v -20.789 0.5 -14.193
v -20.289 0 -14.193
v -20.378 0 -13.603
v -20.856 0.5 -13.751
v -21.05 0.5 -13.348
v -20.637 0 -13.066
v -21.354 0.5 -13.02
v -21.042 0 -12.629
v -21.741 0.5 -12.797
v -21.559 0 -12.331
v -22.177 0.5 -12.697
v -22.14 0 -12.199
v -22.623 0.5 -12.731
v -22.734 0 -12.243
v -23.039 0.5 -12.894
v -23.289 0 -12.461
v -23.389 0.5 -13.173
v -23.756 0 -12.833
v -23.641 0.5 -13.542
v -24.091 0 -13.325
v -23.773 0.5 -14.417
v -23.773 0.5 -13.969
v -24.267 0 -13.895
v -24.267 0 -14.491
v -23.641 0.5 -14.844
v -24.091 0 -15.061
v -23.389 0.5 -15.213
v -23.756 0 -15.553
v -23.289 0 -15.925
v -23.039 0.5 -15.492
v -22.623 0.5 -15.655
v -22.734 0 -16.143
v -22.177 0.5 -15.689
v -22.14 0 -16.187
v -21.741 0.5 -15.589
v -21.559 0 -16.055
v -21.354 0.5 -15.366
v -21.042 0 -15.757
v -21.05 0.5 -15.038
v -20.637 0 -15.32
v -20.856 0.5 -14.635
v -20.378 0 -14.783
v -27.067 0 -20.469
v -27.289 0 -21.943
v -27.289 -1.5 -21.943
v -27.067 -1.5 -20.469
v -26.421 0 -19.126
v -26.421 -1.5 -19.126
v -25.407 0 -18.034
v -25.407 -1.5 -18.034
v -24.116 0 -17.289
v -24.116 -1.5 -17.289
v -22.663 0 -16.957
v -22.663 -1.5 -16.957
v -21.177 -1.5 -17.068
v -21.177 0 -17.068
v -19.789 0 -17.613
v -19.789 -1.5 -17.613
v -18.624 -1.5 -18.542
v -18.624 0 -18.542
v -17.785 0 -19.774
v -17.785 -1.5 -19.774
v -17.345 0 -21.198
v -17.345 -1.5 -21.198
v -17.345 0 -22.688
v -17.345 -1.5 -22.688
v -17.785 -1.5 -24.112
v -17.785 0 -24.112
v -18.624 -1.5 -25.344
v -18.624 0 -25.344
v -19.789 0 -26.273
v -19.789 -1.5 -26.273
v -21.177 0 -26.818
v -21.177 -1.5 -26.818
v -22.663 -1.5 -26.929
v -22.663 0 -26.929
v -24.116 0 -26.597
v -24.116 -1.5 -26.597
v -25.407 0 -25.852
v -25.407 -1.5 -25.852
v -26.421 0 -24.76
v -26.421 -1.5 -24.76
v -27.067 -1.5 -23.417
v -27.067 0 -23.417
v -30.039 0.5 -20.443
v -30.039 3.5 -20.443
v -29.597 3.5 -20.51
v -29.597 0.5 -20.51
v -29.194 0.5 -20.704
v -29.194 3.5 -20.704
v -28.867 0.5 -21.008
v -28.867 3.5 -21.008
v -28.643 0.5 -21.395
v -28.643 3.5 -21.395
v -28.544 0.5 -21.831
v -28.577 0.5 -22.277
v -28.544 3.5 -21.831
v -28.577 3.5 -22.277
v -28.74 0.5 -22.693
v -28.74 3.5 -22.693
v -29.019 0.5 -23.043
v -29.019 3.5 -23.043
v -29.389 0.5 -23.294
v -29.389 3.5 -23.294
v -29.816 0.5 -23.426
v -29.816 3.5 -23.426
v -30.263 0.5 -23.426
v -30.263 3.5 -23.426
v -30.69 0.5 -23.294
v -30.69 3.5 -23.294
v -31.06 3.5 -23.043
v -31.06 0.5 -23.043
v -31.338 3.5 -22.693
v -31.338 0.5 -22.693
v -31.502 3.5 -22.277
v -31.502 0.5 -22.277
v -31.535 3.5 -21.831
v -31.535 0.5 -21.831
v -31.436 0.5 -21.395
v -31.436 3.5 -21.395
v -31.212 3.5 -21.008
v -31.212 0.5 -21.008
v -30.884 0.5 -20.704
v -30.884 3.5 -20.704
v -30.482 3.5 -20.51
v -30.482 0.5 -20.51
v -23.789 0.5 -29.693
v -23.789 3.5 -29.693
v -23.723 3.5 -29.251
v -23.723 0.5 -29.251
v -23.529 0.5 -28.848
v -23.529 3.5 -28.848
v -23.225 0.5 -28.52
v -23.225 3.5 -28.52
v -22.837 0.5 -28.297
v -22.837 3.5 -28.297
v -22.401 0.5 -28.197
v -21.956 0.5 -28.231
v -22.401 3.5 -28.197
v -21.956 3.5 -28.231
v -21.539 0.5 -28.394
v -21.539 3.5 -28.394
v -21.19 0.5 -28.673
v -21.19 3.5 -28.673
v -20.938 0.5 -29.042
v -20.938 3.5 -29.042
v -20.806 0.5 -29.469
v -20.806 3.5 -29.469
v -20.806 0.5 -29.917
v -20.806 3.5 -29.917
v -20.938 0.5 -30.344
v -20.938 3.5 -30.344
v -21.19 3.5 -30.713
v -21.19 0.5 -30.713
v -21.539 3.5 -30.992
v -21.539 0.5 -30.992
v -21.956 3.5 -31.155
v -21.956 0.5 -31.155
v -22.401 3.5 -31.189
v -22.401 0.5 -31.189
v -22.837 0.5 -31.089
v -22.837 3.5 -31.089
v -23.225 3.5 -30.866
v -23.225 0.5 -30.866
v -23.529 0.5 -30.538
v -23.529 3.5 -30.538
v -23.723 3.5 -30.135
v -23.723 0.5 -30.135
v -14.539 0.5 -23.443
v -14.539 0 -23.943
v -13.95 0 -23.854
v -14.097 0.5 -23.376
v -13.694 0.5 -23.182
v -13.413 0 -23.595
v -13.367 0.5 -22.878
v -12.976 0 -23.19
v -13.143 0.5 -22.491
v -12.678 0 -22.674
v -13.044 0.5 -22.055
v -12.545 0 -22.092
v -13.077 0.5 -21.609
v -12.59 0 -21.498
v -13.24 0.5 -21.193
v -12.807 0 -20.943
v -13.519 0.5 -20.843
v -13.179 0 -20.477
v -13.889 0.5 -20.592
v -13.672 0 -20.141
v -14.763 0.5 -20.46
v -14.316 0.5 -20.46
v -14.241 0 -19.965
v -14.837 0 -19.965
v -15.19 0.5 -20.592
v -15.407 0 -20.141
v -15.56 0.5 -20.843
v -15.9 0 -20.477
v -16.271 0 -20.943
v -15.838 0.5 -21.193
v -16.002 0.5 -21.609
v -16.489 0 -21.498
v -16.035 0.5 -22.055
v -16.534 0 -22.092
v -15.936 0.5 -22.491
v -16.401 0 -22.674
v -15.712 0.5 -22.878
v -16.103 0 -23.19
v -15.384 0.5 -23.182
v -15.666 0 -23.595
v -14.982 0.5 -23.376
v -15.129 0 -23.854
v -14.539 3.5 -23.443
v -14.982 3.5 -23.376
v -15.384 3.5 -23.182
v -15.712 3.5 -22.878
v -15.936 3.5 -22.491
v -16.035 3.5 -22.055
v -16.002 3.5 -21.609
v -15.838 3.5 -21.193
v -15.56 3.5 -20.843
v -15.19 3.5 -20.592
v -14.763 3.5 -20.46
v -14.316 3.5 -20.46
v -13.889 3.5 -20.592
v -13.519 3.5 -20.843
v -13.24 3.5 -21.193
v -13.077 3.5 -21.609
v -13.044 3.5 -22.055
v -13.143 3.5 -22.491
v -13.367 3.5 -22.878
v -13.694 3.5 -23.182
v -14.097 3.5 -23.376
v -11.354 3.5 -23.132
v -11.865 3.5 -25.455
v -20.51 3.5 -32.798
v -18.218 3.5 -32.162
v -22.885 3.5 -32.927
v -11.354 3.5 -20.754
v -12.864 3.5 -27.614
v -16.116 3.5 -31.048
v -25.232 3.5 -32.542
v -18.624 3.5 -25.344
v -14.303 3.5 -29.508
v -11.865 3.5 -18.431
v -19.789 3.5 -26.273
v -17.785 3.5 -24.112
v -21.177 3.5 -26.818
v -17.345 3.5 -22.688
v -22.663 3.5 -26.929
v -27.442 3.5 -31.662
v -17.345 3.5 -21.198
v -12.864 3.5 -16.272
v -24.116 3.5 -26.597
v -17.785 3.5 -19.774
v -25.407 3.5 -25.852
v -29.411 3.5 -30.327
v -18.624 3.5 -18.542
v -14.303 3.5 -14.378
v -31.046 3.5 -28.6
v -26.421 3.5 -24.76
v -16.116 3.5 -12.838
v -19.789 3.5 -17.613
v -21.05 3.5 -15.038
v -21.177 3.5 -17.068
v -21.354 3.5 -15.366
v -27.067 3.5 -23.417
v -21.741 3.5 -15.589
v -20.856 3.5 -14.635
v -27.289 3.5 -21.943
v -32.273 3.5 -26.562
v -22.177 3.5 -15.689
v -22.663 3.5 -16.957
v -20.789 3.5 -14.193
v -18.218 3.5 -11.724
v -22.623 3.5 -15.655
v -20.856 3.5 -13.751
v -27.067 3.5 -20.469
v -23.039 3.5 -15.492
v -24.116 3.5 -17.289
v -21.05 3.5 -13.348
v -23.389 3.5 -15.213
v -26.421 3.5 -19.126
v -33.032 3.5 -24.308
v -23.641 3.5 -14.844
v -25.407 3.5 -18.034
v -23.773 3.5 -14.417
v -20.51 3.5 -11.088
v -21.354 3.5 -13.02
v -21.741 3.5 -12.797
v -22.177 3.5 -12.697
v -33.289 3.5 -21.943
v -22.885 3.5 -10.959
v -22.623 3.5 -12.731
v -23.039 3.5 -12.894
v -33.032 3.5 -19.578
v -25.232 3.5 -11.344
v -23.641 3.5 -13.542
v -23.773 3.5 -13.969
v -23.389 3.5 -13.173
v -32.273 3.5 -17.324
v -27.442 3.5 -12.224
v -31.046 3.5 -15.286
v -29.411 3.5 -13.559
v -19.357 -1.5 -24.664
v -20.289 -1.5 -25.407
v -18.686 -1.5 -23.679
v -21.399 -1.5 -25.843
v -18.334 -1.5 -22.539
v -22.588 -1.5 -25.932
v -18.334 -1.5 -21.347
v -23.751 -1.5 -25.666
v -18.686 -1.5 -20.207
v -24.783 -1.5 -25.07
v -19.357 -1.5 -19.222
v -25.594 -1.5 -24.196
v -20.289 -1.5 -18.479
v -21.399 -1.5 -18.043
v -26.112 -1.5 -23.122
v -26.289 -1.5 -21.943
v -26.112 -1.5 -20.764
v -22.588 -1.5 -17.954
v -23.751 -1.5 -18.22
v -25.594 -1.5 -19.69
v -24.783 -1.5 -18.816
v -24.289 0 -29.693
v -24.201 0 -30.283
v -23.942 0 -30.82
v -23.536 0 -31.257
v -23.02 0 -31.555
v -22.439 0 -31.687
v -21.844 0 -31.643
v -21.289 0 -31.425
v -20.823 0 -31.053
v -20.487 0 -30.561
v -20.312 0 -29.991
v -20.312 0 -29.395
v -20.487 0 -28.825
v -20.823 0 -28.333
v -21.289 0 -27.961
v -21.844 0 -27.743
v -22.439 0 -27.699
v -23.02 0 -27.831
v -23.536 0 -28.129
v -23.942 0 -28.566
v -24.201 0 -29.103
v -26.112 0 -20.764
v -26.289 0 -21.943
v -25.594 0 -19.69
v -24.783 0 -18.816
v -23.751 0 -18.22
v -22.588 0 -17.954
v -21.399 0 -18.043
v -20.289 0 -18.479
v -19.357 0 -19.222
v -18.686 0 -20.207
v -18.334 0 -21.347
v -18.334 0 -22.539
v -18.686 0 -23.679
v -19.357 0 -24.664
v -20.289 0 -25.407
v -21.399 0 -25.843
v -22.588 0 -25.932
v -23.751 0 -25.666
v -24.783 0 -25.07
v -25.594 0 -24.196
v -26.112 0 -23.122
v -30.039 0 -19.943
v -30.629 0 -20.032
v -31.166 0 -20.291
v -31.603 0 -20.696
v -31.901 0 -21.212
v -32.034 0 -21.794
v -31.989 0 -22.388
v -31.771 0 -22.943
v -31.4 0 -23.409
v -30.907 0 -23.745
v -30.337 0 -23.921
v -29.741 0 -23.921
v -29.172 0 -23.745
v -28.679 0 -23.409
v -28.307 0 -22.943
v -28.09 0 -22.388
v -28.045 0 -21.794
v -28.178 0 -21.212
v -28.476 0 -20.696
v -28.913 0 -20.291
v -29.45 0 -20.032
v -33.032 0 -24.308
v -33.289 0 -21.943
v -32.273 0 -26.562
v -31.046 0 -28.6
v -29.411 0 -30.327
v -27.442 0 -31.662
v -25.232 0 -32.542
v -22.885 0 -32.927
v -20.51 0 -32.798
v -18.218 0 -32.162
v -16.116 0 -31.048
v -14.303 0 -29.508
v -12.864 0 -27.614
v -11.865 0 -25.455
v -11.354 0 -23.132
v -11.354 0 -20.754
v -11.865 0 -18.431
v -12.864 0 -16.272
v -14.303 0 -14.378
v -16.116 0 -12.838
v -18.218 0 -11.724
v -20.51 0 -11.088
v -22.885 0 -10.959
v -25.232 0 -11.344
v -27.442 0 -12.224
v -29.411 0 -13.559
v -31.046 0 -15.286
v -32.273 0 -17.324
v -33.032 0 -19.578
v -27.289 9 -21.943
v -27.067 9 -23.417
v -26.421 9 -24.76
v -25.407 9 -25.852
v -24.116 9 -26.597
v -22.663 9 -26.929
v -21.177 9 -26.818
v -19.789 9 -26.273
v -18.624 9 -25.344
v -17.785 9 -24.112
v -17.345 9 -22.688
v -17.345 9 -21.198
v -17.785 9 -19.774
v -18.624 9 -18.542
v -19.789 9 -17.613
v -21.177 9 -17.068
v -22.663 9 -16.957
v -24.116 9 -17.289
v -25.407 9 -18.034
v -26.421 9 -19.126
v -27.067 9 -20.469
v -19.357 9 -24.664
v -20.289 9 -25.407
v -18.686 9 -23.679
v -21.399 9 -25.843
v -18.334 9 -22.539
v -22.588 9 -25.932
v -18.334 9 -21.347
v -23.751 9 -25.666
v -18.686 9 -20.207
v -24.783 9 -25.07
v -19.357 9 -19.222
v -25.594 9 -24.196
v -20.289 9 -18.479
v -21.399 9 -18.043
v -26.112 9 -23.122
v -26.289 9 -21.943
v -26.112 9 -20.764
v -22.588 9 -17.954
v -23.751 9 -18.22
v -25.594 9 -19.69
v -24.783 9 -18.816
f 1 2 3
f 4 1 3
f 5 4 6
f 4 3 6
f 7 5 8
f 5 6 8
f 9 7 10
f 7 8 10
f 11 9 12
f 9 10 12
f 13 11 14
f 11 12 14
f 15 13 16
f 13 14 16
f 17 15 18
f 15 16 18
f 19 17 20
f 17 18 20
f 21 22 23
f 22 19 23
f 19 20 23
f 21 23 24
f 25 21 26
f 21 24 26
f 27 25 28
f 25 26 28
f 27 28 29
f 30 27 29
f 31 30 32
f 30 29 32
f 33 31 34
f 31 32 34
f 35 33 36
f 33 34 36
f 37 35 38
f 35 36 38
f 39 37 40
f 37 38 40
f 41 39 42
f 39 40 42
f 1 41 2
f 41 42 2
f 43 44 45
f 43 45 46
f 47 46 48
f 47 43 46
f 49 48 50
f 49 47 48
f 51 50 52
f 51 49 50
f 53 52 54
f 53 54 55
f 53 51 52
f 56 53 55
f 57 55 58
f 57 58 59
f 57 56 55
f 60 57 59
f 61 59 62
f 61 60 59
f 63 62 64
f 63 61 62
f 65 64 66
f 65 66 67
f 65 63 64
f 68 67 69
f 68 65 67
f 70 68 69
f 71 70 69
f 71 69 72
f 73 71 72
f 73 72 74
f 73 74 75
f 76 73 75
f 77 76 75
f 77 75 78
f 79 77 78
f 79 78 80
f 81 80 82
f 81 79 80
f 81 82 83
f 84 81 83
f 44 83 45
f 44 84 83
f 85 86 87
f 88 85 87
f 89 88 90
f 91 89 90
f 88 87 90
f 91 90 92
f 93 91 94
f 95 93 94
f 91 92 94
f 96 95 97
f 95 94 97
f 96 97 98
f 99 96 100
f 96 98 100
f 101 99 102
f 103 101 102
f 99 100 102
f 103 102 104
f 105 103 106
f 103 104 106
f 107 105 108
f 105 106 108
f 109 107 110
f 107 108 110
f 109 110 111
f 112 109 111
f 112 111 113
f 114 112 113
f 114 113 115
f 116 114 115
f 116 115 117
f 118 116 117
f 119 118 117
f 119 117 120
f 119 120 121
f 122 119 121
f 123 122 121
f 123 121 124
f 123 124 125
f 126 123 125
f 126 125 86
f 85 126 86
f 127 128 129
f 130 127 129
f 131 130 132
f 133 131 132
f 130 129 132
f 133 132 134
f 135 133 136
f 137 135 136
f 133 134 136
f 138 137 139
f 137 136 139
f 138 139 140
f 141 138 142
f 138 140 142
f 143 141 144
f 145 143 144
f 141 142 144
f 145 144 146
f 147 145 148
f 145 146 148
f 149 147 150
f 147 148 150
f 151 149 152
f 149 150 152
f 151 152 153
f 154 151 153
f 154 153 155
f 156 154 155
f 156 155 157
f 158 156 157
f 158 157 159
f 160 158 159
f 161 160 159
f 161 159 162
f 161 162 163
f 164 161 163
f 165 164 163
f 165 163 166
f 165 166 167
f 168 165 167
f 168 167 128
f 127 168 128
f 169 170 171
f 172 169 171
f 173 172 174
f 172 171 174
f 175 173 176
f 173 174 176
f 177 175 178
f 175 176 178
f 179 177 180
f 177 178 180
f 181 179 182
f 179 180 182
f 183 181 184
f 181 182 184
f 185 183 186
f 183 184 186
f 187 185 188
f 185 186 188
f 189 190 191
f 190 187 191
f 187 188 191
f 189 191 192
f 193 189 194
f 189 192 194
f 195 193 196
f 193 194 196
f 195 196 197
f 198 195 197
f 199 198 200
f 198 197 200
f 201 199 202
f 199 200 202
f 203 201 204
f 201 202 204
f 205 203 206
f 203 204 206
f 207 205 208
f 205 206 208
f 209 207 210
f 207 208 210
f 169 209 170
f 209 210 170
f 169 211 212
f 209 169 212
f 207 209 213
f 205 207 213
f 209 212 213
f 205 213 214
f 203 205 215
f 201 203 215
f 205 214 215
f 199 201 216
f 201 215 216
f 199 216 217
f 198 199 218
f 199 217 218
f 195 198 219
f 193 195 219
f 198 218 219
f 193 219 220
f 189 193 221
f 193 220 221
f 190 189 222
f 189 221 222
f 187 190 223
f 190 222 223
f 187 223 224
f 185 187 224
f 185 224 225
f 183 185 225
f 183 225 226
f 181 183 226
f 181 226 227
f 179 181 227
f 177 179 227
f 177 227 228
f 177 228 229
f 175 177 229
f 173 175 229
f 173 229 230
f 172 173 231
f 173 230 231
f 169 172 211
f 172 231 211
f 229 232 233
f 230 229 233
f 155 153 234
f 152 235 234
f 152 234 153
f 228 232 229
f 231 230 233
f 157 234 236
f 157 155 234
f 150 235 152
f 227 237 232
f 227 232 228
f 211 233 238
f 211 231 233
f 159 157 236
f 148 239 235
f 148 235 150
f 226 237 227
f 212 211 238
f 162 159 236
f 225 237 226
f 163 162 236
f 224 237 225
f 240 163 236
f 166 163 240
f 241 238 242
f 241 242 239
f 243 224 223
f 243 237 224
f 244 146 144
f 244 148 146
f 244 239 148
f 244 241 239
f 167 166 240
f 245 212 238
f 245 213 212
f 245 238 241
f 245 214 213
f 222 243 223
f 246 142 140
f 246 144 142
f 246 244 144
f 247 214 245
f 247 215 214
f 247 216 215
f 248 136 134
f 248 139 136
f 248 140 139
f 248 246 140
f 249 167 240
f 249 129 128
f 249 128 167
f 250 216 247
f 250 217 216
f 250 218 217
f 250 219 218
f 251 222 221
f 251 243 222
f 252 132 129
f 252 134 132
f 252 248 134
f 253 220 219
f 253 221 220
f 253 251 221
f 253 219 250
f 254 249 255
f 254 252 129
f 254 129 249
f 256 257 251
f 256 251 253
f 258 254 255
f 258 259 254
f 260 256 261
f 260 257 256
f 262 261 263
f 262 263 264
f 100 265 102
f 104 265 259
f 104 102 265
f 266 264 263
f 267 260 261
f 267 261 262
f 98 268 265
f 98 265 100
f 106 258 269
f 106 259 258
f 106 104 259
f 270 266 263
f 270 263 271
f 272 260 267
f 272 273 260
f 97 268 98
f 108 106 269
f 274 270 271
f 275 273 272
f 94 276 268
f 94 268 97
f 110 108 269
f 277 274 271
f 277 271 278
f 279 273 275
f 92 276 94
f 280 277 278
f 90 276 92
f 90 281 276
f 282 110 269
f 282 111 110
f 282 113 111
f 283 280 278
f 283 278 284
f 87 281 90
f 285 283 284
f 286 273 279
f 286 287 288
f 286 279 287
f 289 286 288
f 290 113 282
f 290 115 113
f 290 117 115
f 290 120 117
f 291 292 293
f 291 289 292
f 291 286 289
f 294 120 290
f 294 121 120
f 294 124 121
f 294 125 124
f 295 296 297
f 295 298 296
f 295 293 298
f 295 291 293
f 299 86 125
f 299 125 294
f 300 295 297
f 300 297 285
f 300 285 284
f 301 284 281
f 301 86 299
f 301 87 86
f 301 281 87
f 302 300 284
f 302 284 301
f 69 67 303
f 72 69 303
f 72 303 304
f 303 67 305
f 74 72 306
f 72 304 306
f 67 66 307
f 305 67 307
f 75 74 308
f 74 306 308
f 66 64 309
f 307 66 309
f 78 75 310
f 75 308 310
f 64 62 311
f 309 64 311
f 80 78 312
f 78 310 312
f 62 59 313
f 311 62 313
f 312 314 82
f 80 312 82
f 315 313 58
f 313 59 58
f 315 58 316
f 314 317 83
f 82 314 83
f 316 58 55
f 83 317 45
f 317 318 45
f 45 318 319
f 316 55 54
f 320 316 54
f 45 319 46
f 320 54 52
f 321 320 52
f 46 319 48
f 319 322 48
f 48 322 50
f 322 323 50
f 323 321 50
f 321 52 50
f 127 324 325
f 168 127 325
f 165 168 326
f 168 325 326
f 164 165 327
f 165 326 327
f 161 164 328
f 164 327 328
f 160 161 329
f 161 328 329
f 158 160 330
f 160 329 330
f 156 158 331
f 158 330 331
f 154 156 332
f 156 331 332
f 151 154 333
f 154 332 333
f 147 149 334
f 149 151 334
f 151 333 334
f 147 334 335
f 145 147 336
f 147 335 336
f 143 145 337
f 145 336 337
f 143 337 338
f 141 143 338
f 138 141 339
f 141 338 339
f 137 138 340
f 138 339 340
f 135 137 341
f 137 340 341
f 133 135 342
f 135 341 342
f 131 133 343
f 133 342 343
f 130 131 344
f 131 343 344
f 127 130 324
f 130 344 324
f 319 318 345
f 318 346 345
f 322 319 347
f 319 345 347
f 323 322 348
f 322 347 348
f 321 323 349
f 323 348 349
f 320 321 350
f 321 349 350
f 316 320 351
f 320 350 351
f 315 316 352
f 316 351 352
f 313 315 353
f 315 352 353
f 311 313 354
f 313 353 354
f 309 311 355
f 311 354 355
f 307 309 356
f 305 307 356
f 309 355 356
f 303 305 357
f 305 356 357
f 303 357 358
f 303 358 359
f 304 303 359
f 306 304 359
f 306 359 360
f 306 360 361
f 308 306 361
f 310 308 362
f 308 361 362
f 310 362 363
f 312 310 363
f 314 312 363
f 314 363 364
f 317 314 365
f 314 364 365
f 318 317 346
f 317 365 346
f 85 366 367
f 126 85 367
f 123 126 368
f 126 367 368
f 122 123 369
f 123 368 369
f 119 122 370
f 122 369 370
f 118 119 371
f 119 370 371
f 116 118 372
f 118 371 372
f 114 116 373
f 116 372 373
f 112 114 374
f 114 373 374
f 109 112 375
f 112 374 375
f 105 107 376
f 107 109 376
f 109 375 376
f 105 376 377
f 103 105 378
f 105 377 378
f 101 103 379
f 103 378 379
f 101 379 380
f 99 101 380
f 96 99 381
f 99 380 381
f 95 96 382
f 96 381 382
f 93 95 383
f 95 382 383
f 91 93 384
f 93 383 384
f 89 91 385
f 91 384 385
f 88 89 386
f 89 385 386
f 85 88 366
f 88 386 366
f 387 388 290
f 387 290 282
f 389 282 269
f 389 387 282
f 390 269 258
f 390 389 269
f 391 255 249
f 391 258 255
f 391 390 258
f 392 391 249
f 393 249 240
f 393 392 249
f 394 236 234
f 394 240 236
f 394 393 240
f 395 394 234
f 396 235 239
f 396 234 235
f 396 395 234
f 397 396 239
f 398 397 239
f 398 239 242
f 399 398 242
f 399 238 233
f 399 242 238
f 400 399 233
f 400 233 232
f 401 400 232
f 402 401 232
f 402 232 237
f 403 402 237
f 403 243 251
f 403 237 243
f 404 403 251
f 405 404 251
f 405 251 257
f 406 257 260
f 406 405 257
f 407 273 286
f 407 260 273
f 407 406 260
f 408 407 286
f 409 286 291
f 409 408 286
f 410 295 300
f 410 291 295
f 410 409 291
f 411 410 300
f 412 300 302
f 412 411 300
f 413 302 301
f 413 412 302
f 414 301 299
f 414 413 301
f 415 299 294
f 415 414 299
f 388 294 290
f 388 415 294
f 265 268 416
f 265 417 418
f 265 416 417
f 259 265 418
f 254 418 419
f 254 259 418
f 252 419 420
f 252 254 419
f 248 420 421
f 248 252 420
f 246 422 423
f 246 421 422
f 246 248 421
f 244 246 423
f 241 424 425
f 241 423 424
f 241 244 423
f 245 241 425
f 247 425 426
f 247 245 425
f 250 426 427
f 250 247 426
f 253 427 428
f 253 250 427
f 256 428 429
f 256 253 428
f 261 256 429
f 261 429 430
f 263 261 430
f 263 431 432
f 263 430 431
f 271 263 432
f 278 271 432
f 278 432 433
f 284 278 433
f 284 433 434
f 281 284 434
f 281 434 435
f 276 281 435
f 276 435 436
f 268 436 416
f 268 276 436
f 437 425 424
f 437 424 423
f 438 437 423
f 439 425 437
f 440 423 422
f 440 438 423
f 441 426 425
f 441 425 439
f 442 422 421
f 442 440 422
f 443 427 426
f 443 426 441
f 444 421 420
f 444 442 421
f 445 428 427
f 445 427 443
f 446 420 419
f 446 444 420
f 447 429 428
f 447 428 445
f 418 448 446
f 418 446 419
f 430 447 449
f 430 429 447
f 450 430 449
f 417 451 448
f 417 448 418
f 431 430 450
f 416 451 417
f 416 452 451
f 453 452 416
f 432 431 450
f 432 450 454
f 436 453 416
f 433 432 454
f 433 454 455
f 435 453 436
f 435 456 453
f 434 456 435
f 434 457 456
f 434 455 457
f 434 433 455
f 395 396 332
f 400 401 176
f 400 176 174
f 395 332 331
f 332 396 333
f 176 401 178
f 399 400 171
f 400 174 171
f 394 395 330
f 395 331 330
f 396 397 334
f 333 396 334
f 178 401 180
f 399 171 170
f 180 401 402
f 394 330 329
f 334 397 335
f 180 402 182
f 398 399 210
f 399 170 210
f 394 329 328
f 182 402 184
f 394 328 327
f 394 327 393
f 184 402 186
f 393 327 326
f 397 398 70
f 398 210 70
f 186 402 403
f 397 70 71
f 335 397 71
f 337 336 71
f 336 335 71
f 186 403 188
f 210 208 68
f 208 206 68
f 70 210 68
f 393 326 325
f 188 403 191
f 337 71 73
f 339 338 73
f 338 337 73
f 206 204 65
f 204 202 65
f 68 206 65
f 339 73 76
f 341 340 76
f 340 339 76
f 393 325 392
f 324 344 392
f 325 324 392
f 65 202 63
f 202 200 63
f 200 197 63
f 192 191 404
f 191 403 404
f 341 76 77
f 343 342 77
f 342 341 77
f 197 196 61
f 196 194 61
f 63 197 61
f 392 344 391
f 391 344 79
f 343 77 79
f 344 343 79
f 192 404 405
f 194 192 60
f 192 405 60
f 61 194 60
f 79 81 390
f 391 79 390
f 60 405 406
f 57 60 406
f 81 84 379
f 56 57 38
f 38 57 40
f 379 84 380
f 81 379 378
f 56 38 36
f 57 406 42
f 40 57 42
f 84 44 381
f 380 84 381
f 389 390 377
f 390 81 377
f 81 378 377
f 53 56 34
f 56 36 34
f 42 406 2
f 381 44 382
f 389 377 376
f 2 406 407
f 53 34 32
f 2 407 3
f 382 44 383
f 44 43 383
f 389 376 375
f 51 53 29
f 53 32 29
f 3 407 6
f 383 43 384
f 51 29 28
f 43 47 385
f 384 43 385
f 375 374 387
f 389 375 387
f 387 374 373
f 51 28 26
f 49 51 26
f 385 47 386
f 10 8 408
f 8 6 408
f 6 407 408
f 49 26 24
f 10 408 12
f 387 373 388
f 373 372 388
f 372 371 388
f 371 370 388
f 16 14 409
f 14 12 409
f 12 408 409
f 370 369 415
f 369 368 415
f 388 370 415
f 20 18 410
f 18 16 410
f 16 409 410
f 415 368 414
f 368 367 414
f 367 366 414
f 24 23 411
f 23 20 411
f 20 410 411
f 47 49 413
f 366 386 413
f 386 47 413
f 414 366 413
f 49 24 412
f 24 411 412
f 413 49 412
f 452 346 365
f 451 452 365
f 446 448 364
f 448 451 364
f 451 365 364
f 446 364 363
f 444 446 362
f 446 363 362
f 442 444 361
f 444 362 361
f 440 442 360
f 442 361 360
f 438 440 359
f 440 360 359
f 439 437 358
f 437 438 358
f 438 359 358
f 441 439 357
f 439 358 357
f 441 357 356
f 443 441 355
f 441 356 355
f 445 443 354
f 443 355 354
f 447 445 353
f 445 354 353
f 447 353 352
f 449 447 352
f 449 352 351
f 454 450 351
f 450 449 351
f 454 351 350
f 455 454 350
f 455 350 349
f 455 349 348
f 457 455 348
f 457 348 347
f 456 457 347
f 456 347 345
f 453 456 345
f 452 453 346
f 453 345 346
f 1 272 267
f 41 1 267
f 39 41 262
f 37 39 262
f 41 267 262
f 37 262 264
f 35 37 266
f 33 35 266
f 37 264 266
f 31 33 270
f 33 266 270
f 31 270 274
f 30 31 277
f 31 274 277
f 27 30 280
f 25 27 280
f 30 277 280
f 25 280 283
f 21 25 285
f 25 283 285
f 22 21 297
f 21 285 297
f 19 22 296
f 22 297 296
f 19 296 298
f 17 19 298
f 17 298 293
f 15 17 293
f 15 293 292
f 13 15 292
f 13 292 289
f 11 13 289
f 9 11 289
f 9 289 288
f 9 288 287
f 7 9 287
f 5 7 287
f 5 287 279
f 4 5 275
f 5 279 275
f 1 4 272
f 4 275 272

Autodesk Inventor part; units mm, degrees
ref_plane "YZ Plane" through (0, 0, 0) normal (1, 0, 0) x (0, 1, 0)
ref_plane "XZ Plane" through (0, 0, 0) normal (0, 1, 0) x (-1, 0, 0)
ref_plane "XY Plane" through (0, 0, 0) normal (0, 0, 1) x (1, 0, 0)
sketch "Sketch1" plane through (0, 0, 0) normal (0, 1, 0) x (-1, 0, 0)
  circle A0 centre (22.2894, -21.943) radius 11
  circle A1 centre (22.2894, -21.943) radius 7.75 construction
  circle A2 centre (22.2894, -21.943) radius 5
  circle A3 centre (22.2894, -21.943) radius 4
  point P0 (0, 0)
  point P1 (14.5394, -21.943)
  dimension "d2" = 15.5
  dimension "d1" = 22
  dimension "d4" = 10
  dimension "d17" = 8
extrude "Extrusion1" add sketch "Sketch1" along normal blind 3.5 contours A0
hole "Hole1" at (-14.5394, 0, -21.943) direction (0, 1, 0) diameter 3 end through all countersink diameter 4 countersink angle 90
pattern_circular "Circular Pattern1" count 4 over 360 about axis through (-22.2894, 0, -21.943) along (0, 1, 0) of "Hole1"
extrude "Extrusion2" add sketch "Sketch1" along normal blind 9 and the other way blind 1.5 contours A2
properties part number "ACME Brass Nut" material "Brass, Soft Yellow"
